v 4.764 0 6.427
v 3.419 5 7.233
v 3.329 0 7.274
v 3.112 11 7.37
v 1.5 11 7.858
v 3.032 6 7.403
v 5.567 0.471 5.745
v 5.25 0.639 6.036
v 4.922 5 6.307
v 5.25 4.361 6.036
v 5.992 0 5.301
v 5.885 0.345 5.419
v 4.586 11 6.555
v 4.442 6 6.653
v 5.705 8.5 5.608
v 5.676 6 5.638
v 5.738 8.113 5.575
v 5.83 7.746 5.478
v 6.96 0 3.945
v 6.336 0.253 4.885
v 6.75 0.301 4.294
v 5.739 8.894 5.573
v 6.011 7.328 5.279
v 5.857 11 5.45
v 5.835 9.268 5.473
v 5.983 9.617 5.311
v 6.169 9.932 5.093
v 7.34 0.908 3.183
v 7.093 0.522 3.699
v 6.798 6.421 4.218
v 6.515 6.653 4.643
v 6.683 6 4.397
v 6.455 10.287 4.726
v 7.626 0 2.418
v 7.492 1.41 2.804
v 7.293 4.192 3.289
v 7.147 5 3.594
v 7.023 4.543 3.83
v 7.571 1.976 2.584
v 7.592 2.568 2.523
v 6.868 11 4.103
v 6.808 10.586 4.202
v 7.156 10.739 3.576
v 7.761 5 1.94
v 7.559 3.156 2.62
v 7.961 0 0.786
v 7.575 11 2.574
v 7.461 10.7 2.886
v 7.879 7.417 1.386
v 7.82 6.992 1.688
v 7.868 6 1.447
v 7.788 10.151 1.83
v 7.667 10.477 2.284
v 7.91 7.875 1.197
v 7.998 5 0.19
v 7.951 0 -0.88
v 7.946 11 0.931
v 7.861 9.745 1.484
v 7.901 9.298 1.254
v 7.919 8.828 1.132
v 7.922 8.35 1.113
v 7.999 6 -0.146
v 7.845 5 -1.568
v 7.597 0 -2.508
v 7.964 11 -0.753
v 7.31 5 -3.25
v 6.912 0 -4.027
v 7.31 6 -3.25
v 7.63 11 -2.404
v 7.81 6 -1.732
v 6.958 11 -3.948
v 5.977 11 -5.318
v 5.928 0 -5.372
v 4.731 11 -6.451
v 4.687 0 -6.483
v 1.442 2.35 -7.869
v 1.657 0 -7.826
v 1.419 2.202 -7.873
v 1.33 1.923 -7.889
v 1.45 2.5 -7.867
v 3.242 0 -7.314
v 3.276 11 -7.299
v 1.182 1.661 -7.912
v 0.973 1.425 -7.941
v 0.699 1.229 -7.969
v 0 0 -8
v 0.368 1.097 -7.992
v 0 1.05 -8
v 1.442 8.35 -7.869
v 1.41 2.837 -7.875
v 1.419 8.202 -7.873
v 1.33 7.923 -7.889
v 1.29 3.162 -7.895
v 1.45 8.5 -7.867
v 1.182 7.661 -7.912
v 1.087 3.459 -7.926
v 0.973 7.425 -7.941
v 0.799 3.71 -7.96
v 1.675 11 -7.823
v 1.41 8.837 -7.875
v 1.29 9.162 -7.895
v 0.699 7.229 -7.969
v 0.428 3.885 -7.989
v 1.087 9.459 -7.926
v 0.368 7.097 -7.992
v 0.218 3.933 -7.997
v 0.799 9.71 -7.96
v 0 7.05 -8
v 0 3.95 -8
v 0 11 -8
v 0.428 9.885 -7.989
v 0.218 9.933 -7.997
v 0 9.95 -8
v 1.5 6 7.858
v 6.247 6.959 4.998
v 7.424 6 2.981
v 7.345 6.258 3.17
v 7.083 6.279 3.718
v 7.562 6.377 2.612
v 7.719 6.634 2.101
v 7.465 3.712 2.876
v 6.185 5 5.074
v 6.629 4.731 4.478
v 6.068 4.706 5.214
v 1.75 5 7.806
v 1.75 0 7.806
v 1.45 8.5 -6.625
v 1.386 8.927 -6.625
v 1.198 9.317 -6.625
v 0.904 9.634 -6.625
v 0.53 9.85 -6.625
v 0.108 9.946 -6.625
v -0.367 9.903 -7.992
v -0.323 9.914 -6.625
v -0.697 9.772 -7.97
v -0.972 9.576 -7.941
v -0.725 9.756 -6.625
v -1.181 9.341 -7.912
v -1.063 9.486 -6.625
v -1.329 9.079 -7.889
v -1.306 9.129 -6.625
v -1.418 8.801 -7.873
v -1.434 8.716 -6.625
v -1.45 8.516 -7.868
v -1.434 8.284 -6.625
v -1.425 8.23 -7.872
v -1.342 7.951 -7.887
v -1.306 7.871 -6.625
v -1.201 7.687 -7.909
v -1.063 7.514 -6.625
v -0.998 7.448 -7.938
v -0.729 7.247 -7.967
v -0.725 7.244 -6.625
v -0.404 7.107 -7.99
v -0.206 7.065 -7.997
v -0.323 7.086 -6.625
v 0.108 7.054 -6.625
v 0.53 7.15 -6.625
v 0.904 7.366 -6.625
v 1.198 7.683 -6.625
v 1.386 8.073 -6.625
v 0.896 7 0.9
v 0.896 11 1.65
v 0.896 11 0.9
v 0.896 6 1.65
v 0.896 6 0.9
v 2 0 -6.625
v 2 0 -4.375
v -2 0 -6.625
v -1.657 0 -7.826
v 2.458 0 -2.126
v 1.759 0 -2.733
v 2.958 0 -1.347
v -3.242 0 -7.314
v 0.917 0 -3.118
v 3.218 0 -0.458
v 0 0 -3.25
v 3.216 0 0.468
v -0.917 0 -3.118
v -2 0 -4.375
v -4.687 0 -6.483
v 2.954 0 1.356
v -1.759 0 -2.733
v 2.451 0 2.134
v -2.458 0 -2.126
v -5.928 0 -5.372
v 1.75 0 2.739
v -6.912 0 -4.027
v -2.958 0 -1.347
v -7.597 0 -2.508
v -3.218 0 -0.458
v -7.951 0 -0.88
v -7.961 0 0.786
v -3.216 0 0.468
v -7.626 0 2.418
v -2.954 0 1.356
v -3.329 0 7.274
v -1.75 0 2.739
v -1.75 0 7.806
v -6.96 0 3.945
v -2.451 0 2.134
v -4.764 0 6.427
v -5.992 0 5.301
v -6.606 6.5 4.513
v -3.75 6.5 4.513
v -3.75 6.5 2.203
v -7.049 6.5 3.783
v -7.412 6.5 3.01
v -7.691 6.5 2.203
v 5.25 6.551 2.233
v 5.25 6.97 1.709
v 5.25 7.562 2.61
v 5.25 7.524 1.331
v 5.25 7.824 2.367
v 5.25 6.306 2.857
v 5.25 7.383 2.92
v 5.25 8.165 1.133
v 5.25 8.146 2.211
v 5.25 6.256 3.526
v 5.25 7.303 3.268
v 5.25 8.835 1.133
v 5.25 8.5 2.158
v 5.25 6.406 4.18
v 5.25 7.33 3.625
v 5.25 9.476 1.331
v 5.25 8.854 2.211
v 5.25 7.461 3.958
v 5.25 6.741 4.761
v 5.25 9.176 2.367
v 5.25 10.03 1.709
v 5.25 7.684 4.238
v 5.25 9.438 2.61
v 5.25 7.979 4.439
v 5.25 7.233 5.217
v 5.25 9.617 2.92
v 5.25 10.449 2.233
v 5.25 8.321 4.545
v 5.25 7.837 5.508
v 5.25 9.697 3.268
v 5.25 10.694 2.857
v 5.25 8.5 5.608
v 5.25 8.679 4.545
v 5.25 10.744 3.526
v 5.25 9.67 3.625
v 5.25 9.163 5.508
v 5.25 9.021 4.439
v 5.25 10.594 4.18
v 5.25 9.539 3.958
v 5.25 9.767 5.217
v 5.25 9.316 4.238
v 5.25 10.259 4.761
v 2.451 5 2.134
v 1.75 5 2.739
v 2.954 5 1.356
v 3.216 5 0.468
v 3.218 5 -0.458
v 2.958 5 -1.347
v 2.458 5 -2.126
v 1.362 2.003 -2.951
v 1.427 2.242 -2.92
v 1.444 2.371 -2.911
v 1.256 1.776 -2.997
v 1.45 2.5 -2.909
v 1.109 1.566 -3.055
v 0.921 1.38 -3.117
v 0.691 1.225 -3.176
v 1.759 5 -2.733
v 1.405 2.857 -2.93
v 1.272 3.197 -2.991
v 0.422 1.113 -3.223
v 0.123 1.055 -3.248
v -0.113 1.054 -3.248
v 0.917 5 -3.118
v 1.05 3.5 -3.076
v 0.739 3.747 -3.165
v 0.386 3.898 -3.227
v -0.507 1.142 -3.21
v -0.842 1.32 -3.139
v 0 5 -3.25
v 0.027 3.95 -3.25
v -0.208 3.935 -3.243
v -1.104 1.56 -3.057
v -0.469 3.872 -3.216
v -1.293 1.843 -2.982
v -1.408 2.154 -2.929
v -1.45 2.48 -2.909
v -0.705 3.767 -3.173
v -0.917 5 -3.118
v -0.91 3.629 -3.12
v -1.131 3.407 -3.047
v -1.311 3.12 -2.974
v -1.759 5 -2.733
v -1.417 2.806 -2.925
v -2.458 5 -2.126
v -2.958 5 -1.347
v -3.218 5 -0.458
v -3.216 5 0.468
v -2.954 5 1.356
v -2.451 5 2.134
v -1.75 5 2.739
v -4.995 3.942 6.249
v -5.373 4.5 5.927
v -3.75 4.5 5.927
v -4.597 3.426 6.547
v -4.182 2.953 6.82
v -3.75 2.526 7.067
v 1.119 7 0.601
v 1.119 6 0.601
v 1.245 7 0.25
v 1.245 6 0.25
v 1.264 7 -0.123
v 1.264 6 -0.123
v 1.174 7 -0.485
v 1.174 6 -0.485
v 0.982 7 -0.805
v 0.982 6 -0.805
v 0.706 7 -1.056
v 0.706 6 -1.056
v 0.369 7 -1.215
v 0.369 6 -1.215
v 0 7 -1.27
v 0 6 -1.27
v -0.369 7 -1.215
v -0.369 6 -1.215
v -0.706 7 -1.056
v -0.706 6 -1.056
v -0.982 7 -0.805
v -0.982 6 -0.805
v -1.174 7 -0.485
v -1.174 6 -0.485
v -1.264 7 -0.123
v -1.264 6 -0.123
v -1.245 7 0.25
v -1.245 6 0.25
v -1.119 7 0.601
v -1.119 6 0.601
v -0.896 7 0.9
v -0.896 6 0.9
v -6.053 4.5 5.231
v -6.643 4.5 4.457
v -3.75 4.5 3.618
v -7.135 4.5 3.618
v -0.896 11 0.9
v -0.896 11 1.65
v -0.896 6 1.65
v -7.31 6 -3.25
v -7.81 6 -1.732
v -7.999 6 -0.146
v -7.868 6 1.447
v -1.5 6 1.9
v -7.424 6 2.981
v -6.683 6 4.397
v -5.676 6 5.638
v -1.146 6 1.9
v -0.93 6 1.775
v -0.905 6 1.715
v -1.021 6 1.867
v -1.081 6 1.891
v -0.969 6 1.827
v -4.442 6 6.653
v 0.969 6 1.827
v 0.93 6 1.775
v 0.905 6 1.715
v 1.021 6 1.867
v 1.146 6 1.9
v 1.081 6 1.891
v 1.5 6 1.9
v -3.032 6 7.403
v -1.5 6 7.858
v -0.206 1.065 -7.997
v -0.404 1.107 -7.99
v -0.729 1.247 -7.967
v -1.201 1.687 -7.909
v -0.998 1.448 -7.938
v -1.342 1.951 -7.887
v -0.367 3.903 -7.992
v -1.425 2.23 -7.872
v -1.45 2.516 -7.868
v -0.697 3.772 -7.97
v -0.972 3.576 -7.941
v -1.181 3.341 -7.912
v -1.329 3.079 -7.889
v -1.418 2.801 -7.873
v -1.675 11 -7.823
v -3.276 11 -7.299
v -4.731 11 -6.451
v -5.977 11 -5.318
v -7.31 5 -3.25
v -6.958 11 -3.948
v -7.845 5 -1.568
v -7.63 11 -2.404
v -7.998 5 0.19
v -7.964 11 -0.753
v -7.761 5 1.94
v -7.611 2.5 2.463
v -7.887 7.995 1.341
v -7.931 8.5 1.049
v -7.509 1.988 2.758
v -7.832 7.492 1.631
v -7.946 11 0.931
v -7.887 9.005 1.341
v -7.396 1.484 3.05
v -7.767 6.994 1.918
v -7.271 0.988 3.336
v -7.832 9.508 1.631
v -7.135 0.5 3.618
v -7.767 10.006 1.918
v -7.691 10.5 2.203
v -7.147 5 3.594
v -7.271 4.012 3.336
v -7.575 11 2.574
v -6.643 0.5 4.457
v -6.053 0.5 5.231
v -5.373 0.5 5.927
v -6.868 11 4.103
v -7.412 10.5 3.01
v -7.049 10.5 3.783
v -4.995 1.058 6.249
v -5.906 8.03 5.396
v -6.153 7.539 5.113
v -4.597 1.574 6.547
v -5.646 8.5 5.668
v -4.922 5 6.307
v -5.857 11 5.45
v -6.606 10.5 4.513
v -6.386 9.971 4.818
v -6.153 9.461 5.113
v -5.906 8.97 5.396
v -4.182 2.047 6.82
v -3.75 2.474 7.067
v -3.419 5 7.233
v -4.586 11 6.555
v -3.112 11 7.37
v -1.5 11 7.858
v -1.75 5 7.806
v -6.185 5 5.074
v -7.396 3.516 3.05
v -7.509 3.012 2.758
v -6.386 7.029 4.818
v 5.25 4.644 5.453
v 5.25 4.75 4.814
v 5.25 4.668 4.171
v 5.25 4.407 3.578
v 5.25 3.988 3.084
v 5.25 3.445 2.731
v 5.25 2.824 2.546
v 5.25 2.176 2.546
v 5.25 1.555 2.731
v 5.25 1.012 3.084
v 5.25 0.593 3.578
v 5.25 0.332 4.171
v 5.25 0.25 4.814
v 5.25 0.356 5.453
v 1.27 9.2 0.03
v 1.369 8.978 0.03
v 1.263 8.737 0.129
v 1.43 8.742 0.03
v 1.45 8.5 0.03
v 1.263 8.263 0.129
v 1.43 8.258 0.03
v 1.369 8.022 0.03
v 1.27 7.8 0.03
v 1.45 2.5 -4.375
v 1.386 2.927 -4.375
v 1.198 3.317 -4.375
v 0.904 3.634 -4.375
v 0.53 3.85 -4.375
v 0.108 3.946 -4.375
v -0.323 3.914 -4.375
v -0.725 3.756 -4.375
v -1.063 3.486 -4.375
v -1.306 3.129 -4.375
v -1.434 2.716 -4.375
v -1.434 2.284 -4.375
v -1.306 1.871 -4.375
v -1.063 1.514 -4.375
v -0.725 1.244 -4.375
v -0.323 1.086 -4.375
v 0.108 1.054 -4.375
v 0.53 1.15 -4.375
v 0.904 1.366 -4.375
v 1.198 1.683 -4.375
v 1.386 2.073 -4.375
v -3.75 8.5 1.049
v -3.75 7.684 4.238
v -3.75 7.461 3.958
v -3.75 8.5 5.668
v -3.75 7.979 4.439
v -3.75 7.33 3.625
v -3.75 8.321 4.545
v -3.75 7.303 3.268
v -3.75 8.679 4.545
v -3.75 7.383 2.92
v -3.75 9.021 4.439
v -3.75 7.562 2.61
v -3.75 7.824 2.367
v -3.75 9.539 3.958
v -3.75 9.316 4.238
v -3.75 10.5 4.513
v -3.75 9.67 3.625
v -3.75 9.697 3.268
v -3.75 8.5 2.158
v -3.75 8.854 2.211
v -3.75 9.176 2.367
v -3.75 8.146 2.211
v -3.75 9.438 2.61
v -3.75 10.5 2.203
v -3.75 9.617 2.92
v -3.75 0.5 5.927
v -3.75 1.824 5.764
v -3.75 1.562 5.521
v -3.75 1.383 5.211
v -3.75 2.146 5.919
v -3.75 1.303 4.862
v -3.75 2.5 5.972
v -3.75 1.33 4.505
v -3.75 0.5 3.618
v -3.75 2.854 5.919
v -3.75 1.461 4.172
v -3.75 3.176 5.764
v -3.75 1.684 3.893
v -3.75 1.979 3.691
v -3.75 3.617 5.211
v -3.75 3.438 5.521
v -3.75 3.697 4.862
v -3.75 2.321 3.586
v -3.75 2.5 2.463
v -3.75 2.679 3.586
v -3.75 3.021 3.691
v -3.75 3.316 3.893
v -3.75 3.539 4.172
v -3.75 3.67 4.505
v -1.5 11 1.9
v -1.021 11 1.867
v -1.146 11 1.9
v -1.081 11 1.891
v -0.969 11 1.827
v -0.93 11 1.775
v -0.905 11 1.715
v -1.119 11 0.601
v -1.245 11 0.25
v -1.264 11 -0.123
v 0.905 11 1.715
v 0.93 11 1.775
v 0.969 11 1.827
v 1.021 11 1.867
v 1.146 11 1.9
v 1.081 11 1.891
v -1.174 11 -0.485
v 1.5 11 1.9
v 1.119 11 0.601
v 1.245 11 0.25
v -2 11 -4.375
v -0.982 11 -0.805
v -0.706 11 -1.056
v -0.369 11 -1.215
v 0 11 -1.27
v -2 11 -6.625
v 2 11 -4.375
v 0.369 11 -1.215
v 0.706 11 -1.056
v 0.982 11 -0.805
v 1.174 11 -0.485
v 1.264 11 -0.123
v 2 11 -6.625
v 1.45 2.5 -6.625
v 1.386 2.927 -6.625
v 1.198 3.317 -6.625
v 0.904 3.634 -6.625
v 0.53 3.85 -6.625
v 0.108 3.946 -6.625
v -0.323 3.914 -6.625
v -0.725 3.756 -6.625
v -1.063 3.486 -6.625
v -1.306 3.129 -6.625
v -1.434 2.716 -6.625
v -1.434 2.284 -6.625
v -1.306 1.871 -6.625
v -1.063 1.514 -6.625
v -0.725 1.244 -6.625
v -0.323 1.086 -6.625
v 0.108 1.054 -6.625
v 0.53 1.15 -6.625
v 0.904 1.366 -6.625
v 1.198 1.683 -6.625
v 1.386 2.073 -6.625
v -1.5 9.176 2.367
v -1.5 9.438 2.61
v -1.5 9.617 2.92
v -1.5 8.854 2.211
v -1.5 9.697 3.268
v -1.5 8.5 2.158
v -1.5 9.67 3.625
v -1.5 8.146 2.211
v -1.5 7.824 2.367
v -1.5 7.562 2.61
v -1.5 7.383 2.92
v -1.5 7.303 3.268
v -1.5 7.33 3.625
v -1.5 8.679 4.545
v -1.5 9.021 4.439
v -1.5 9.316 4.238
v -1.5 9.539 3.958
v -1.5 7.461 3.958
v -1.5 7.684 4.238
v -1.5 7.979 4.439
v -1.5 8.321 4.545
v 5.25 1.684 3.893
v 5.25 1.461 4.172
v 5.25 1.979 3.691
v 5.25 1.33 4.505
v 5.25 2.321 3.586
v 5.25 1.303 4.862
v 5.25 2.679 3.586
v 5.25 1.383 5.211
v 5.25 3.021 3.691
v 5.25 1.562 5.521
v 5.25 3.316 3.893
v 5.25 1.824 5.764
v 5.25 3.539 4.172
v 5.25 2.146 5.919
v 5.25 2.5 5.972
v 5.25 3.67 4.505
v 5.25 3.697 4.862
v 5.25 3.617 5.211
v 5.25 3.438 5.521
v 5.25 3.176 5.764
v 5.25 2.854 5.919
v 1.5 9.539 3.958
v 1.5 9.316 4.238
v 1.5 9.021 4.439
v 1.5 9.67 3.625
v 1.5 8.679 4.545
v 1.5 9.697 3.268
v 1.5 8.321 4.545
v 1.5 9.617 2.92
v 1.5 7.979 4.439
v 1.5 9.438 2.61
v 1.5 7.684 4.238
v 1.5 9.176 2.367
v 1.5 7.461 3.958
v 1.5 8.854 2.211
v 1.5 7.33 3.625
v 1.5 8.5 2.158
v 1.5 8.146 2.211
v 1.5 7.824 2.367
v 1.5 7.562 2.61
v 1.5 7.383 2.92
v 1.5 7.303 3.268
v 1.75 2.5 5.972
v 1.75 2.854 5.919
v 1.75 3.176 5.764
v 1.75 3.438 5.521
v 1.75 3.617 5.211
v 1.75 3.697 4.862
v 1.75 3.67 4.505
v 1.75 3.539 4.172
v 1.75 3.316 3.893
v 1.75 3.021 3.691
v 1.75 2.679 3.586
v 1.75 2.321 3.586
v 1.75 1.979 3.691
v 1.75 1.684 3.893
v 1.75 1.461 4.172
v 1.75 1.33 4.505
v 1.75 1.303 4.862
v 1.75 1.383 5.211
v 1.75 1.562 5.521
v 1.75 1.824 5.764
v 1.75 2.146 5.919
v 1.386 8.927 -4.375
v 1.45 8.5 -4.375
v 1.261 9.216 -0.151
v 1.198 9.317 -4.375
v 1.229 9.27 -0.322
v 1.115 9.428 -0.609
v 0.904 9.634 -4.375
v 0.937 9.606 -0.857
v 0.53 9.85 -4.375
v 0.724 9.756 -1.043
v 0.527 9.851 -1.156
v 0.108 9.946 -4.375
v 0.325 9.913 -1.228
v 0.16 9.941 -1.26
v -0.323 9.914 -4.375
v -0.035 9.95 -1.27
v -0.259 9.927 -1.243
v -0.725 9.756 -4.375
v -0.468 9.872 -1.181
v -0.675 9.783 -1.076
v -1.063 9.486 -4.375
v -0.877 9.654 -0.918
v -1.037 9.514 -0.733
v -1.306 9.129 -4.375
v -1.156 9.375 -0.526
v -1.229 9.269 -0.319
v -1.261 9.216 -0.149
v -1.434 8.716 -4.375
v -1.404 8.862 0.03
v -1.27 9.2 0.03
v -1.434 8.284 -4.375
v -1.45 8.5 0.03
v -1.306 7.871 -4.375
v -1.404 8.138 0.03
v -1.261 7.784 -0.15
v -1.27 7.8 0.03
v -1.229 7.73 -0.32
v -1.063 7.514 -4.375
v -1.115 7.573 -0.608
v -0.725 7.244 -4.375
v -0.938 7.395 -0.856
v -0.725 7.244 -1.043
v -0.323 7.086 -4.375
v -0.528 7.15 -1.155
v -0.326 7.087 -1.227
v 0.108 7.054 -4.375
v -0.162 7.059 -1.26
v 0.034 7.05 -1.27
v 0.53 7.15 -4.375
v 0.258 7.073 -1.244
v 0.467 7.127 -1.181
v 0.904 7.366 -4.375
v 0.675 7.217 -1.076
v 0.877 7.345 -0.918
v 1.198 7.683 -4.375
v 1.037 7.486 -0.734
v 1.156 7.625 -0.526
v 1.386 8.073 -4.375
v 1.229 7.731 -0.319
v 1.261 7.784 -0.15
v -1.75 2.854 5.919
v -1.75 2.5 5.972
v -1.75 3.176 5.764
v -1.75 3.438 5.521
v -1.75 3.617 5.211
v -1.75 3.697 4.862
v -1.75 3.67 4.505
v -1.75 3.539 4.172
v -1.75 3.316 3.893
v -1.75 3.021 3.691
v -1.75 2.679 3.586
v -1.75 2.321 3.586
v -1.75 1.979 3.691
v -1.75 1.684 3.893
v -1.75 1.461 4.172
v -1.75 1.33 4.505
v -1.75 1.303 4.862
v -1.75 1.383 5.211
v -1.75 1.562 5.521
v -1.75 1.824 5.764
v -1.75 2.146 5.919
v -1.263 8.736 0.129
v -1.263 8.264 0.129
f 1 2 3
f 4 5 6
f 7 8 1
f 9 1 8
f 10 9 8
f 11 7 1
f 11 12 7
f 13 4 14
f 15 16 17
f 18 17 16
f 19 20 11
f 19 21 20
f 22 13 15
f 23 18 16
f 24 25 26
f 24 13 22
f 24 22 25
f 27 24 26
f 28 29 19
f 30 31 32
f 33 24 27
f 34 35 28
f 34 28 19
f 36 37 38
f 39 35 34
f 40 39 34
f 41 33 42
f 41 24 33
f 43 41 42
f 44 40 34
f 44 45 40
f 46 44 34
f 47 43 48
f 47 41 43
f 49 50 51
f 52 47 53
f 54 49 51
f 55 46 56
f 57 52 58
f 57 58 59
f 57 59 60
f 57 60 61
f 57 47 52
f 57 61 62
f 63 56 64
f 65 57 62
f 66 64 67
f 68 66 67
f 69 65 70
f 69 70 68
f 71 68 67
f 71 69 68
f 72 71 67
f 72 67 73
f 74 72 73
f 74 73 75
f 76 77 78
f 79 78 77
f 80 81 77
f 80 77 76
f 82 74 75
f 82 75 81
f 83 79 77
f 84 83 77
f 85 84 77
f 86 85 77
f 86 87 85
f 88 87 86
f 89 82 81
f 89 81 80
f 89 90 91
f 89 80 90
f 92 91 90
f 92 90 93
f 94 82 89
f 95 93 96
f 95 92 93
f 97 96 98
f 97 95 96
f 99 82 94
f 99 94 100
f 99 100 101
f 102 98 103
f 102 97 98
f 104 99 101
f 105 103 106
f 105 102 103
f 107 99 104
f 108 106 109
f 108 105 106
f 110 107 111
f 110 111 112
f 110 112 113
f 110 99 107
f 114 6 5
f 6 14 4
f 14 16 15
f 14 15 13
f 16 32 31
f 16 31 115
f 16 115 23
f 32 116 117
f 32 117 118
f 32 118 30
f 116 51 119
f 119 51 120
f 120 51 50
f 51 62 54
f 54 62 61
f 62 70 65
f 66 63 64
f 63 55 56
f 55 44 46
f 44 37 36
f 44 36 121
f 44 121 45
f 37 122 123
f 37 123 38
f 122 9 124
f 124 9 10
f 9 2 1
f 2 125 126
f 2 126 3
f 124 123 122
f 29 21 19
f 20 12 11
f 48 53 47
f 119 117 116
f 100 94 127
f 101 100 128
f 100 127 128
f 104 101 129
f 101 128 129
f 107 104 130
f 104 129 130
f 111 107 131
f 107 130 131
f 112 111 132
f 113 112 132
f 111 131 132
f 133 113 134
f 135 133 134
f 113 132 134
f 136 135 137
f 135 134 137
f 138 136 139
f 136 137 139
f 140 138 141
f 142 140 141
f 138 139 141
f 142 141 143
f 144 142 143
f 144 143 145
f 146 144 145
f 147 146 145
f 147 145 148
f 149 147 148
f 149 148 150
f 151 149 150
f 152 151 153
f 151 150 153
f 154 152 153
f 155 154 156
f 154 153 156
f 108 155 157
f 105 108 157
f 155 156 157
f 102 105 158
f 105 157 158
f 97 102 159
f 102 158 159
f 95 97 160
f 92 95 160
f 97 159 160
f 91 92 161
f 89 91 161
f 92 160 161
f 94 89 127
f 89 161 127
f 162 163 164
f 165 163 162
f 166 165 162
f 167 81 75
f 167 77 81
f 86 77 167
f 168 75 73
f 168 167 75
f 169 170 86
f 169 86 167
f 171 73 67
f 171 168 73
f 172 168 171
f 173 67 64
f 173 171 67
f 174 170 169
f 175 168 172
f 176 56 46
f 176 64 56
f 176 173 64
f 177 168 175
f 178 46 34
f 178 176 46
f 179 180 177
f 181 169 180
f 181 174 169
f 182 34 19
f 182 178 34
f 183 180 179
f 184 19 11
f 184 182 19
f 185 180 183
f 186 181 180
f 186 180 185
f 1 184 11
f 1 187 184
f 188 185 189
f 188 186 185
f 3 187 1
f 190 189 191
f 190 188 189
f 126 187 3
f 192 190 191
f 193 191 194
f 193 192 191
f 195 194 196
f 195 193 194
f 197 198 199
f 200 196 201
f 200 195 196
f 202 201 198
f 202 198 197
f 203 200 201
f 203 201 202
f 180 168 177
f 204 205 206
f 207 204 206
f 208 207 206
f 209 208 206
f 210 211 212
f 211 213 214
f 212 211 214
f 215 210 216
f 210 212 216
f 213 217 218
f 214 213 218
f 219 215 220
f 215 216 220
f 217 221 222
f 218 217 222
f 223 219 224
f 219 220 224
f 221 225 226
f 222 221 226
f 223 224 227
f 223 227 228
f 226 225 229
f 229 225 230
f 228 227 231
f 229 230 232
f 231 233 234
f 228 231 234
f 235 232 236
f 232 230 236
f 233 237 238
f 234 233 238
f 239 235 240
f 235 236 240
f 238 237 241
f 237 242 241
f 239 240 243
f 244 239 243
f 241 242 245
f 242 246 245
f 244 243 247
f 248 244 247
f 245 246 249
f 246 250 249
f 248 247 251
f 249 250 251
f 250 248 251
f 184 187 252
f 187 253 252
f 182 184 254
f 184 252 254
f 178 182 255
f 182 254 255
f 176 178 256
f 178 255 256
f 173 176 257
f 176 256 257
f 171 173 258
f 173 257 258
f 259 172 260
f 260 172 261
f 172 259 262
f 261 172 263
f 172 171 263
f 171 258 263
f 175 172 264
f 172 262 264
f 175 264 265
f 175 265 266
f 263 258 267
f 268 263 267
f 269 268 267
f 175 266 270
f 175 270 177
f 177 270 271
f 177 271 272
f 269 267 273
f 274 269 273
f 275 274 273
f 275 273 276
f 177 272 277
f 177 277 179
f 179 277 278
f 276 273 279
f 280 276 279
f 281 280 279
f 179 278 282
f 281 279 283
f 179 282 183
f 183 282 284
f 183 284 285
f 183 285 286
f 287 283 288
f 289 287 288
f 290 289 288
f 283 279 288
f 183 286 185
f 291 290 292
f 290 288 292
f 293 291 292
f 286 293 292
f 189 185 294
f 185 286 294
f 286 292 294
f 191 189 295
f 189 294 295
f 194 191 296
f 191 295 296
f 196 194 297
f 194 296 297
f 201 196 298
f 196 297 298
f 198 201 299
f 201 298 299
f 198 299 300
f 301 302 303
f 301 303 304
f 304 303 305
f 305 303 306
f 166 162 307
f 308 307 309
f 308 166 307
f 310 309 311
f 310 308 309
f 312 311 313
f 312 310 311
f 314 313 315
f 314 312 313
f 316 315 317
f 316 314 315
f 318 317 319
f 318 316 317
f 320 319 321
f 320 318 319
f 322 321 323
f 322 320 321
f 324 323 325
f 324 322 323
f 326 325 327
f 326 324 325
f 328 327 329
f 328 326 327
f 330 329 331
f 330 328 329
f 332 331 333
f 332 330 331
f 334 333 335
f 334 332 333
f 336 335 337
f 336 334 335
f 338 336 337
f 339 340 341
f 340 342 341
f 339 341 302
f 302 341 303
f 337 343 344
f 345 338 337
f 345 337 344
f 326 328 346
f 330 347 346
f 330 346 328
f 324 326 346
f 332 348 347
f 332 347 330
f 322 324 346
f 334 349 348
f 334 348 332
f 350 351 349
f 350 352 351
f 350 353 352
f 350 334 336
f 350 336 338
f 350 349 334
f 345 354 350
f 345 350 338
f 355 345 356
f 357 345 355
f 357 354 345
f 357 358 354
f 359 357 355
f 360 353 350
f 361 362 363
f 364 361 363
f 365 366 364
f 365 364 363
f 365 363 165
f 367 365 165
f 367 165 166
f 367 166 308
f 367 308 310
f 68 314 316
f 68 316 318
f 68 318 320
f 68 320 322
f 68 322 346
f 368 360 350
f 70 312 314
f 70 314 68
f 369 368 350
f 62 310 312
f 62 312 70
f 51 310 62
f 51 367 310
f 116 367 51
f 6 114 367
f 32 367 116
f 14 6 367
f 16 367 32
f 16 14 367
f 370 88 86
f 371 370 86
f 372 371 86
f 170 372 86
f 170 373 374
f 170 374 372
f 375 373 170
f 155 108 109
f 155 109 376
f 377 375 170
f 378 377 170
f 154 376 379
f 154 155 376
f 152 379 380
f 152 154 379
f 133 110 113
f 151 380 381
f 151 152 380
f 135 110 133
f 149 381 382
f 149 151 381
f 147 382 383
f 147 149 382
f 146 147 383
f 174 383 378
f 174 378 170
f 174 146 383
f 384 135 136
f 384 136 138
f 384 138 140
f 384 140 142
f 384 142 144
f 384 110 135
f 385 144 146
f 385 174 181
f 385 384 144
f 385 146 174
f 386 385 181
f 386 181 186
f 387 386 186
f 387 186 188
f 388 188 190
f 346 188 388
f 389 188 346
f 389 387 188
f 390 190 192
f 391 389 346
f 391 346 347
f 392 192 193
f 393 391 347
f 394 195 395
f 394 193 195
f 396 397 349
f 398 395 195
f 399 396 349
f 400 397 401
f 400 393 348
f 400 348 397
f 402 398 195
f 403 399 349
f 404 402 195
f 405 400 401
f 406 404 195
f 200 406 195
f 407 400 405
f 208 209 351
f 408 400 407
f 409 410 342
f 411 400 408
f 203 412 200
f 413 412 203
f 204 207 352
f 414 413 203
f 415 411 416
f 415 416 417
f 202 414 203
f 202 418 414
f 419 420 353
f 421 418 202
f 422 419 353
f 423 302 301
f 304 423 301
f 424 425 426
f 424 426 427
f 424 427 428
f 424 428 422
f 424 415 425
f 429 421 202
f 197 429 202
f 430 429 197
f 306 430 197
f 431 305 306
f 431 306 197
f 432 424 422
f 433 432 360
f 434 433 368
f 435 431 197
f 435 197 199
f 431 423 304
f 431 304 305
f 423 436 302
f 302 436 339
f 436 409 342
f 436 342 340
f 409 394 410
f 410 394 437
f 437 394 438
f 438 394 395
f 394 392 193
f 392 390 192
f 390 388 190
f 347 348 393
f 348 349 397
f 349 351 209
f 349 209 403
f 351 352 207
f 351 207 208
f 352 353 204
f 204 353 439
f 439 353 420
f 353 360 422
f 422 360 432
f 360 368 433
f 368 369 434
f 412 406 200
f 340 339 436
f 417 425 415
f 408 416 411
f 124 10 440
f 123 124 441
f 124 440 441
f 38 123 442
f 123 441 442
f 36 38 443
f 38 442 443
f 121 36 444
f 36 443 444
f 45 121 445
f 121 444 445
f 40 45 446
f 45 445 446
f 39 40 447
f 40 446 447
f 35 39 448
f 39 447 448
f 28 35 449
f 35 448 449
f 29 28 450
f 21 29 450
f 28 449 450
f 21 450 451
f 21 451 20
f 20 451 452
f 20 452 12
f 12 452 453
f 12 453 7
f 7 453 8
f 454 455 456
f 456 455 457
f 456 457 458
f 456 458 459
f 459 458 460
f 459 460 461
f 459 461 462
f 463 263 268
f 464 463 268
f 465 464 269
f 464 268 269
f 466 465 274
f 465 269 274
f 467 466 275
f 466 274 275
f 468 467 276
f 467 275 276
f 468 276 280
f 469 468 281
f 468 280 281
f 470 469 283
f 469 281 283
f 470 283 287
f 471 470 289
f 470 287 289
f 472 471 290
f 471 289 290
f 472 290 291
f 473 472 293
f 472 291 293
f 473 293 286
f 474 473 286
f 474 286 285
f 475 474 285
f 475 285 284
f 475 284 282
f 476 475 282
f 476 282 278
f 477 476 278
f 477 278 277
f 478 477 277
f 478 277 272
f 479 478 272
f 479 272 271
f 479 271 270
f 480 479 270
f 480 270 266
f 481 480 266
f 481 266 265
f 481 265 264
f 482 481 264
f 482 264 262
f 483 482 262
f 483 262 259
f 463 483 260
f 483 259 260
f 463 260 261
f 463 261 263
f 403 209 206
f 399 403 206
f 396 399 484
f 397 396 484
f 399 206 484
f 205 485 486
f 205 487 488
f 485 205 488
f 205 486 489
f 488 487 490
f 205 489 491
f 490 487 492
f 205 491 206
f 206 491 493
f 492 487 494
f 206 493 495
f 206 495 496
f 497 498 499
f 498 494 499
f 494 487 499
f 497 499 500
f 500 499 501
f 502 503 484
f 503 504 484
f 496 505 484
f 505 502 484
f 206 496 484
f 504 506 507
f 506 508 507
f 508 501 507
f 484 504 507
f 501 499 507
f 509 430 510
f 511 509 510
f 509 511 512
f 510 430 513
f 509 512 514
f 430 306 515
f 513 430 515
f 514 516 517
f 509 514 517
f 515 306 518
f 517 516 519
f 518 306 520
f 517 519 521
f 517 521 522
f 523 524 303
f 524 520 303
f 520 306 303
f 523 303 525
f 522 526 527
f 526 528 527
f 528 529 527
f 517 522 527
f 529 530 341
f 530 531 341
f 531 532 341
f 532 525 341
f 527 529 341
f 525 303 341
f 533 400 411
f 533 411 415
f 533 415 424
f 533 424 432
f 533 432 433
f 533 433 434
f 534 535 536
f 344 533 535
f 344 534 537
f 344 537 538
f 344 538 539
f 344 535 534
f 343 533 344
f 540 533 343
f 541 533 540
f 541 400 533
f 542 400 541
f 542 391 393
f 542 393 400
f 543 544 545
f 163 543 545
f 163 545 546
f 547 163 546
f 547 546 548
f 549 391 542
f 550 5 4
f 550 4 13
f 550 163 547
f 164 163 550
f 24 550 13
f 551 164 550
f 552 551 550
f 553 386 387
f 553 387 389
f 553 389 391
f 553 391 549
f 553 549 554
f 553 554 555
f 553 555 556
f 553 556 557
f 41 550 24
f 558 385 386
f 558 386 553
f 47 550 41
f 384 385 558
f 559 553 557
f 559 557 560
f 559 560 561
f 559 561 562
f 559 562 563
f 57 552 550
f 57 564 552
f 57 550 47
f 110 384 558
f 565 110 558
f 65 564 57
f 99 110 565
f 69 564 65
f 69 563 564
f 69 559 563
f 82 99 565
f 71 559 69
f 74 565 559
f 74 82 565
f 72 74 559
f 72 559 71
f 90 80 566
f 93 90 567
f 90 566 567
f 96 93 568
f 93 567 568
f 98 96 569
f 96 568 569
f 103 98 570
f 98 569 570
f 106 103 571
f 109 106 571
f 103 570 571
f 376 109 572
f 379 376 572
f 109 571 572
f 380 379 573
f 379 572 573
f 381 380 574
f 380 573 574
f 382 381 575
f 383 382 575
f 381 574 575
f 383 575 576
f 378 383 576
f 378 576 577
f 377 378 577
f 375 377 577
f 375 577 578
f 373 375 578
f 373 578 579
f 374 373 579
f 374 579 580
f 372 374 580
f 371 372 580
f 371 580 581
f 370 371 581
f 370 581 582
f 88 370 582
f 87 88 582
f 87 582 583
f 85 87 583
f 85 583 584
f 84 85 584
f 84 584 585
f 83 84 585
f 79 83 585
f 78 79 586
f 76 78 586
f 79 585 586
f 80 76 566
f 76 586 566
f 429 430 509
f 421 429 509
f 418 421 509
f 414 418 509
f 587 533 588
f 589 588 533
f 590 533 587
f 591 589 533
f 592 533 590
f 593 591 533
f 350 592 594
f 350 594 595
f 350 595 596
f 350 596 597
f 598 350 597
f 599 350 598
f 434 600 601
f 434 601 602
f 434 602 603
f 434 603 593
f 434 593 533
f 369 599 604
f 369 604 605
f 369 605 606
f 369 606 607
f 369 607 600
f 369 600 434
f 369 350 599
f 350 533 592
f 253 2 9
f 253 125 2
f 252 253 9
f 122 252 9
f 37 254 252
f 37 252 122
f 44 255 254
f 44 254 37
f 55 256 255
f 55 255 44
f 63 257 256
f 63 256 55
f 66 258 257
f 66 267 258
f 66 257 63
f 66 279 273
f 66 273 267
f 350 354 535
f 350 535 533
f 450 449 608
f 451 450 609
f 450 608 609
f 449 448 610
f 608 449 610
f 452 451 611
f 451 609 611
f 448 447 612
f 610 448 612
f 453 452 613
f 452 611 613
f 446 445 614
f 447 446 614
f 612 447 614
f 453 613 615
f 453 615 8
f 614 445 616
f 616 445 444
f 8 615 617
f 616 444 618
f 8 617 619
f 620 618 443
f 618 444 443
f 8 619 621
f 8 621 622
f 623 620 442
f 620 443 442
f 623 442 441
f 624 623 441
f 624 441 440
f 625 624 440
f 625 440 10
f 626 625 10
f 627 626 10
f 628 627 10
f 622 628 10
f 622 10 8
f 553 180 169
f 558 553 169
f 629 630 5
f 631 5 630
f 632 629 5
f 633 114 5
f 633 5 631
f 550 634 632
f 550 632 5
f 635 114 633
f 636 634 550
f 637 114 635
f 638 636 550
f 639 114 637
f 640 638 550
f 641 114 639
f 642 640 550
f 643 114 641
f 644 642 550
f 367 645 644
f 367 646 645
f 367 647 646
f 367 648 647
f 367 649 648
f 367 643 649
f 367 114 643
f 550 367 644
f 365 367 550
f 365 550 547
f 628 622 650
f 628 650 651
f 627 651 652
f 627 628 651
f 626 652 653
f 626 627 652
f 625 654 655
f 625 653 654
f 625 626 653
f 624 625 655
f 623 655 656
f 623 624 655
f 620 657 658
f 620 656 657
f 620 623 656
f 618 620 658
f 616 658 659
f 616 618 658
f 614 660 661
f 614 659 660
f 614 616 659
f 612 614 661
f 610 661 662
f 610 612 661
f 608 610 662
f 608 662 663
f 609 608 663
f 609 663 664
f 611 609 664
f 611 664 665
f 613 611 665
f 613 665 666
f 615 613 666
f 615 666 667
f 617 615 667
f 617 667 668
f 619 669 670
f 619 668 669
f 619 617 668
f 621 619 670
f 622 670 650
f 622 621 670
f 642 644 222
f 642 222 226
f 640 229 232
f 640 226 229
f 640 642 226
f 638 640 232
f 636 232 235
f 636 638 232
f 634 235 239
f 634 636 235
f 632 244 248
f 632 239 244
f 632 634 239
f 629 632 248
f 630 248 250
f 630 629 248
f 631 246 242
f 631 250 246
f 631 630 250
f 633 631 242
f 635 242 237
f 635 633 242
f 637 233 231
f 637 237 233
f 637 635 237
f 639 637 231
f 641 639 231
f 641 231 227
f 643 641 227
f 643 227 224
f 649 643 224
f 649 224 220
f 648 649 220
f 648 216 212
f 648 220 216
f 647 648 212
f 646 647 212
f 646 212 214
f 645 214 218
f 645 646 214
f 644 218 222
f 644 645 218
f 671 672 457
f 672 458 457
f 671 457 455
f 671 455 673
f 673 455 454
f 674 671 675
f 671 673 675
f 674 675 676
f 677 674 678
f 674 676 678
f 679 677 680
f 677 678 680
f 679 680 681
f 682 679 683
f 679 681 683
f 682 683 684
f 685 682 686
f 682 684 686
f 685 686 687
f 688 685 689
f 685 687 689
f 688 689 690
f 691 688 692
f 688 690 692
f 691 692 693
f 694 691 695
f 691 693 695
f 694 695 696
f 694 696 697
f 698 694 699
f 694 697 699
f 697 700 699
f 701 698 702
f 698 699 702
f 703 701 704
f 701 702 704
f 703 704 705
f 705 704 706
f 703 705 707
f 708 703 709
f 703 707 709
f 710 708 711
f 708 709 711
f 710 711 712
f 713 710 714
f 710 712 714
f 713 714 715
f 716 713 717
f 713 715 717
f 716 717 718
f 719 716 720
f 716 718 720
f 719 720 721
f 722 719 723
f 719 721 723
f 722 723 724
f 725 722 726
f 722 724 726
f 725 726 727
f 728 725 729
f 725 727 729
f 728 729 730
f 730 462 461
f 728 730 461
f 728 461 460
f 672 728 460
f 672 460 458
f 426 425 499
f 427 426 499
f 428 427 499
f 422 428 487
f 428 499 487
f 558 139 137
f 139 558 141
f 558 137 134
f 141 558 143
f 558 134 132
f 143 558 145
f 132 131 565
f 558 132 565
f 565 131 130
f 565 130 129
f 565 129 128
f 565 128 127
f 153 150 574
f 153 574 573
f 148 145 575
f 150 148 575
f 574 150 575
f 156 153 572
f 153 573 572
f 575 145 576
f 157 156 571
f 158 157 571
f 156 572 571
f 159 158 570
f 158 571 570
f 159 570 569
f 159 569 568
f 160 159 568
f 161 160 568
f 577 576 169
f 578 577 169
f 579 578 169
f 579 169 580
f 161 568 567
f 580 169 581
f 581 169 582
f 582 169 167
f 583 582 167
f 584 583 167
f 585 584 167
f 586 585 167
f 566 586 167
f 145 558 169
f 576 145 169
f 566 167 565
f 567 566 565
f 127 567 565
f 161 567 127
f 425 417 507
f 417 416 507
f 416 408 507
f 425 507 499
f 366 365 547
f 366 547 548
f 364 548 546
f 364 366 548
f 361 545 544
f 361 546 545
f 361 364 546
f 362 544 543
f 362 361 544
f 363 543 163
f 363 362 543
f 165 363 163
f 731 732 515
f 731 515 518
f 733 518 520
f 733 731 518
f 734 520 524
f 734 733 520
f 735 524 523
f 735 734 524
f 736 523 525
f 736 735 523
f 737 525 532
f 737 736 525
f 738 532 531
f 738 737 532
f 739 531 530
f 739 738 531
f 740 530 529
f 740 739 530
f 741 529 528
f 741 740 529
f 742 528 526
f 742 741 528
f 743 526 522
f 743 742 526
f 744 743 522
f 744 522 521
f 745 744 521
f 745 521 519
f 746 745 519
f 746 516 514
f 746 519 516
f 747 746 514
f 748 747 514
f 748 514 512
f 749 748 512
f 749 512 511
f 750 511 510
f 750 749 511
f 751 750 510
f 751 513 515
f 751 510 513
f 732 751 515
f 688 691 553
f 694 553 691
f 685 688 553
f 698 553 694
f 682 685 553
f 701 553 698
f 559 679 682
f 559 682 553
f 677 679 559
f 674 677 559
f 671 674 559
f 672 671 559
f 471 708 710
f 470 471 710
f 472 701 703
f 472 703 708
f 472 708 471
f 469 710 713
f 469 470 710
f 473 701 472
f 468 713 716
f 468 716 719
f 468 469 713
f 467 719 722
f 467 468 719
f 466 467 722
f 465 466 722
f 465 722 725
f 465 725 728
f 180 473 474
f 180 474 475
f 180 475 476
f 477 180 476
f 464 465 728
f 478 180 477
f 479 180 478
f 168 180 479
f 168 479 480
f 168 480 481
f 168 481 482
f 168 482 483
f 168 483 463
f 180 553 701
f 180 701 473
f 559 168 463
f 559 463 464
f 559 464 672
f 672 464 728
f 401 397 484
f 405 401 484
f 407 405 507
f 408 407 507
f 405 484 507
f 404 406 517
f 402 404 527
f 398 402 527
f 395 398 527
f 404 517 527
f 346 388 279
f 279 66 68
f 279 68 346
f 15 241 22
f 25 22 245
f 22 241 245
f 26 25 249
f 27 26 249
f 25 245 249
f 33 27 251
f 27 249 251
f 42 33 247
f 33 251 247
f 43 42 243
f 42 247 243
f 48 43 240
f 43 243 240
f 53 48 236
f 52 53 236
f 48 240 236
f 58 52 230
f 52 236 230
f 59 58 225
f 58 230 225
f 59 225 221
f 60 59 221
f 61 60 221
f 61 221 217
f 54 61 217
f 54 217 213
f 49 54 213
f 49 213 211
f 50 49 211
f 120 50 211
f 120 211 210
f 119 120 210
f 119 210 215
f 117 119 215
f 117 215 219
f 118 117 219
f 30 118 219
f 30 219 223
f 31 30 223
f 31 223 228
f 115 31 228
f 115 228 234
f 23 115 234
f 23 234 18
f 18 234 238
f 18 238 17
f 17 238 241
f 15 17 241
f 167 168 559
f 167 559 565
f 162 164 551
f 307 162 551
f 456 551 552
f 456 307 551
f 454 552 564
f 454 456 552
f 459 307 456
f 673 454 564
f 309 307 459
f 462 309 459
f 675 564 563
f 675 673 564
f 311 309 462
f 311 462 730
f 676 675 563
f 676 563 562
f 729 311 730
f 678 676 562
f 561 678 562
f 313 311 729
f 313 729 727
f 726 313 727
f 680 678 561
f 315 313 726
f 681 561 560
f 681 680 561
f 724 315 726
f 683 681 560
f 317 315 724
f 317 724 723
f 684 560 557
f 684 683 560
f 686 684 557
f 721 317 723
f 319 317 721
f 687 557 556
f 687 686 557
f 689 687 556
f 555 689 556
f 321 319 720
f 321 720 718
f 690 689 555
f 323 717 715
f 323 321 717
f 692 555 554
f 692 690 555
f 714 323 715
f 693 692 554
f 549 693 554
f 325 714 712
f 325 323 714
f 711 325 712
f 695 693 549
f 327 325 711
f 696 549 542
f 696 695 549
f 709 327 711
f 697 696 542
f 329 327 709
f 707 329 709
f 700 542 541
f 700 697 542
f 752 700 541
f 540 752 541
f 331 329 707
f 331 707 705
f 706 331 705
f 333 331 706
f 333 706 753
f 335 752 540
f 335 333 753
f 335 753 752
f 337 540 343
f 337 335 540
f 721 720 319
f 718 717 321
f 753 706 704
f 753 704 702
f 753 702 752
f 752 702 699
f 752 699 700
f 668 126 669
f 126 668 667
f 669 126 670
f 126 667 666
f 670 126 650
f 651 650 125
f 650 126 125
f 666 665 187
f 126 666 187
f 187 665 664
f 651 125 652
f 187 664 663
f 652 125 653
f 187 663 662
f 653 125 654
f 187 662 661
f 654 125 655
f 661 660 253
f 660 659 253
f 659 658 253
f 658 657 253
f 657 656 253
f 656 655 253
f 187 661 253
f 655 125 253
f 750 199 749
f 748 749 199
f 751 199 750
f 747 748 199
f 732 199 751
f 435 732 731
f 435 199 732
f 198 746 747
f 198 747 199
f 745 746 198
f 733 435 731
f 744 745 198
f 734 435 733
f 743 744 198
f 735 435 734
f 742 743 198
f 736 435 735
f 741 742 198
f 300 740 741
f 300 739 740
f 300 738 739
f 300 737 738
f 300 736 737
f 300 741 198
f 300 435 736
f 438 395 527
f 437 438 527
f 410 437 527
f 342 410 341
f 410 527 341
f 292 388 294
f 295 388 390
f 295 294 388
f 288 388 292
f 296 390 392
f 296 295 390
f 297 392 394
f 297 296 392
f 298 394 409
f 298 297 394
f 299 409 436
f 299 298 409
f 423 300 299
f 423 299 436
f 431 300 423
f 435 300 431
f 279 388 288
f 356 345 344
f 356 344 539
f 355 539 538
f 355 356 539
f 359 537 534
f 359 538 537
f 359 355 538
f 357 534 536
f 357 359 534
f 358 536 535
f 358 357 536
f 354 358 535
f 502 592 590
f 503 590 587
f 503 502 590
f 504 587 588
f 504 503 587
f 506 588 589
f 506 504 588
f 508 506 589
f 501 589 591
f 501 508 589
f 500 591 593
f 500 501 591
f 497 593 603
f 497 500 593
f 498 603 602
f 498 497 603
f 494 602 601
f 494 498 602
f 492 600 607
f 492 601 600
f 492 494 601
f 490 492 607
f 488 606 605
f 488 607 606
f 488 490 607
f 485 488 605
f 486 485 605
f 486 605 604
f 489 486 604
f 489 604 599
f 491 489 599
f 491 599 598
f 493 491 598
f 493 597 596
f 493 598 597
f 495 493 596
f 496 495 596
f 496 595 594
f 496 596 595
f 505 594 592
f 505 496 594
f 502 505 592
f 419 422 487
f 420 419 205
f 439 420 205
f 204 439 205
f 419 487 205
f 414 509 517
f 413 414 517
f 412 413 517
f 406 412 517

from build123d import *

# Parameters (mm, degrees)
SKETCH1_W                            = 4.75
SKETCH1_H                            = 7
FILLET1_R                            = 1
SKETCH16_W                           = 16
SKETCH16_H                           = 1
CUT_EXTRUDE5_DEPTH                   = 1
CUT_EXTRUDE5_DIRECTION_2_REACH       = 18.492
CUT_EXTRUDE6_REACH                   = 15.304
SKETCH17_W                           = 3.5
SKETCH17_H                           = 5.261387212
CUT_EXTRUDE7_DEPTH                   = 18.408690359
CUT_EXTRUDE7_DEPTH_BACK              = 18.408690359
SKETCH18_R                           = 1.2
CUT_EXTRUDE10_START                  = -6
SKETCH21_R                           = 1.27
CUT_EXTRUDE10_DEPTH                  = 6
CUT_EXTRUDE11_DEPTH                  = 18.26991621
CUT_EXTRUDE11_DEPTH_BACK             = 18.26991621
SKETCH22_R                           = 1.2
CUT_EXTRUDE9_REACH                   = 20.603
CUT_EXTRUDE9_END_RADIUS              = 8
SKETCH20_R                           = 1.2
CUT_EXTRUDE12_REACH                  = 21.585
SKETCH19_R                           = 2.25
CUT_EXTRUDE13_REACH                  = 21.585
CUT_EXTRUDE13_END_RADIUS             = 8
SKETCH24_R                           = 2.25
CUT_EXTRUDE14_REACH                  = 18.492
CUT_EXTRUDE14_END_RADIUS             = 8
SKETCH25_W                           = 2.25
SKETCH25_H                           = 1
CUT_EXTRUDE14_DIRECTION_2_REACH      = 18.492
CUT_EXTRUDE14_DIRECTION_2_END_RADIUS = 8
M2_5_CLEARANCE_HOLE1_D               = 2.9
M2_5_CLEARANCE_HOLE1_DEPTH           = 8.029752102
M2_5_CLEARANCE_HOLE1_TIP             = 0.871247898
CUT_EXTRUDE15_START                  = -12
SKETCH29_W                           = 4
SKETCH29_H                           = 2.25
CUT_EXTRUDE15_DEPTH                  = 12
FILLET3_R                            = 0.25
SKETCH30_R                           = 8
CUT_EXTRUDE19_DEPTH                  = 1
BOSS_EXTRUDE1_START                  = 1
BOSS_EXTRUDE1_DEPTH                  = 1


with BuildPart() as part:
    # Sketch1 → Revolve1 (revolve)
    with BuildSketch(Plane.XY, mode=Mode.PRIVATE) as revolve1_sk:
        with Locations((5.625, 3.5)):
            Rectangle(SKETCH1_W, SKETCH1_H)
    revolve(revolve1_sk.sketch.rotate(Axis((0, 0, 0), (0, 1, 0)), 90), axis=Axis((0, 0, 0), (0, 1, 0)))

    # Sketch1<3> → Revolve2 (revolve)
    with BuildSketch(Plane.XY, mode=Mode.PRIVATE) as revolve2_sk:
        Polygon((1.27, 7), (3.25, 7), (8, 7), (8, 12), (1.27, 12), align=None)
    revolve(revolve2_sk.sketch.rotate(Axis((0, 0, 0), (0, 1, 0)), 90), axis=Axis((0, 0, 0), (0, 1, 0)))

    # Fillet1
    fillet1_edges = [part.edges().sort_by_distance(p)[0] for p in [
        (0, 12, 8),
    ]]
    fillet(fillet1_edges, radius=FILLET1_R)

    # Sketch16 → Cut-Extrude5 (cut)
    with BuildSketch(Plane.XY):
        with Locations((0, 5.5)):
            Rectangle(SKETCH16_W, SKETCH16_H)
    extrude(amount=-CUT_EXTRUDE5_DEPTH, mode=Mode.SUBTRACT)

    # Sketch16 → Cut-Extrude5 direction 2 (cut, up to next)
    with BuildSketch(Plane.XY, mode=Mode.PRIVATE) as cut_extrude5_direction_2_sk1:
        with Locations((0, 5.5)):
            Rectangle(SKETCH16_W, SKETCH16_H)
    cut_extrude5_direction_2_tool1 = extrude(cut_extrude5_direction_2_sk1.sketch, amount=CUT_EXTRUDE5_DIRECTION_2_REACH, mode=Mode.PRIVATE) & part.part
    add(cut_extrude5_direction_2_tool1.solids().sort_by_distance((0, 5.5, 0))[0], mode=Mode.SUBTRACT)

    # Sketch17 → Cut-Extrude6 (cut, up to next)
    with BuildSketch(Plane(origin=(0, 5, 0), x_dir=(1, 0, 0), z_dir=(0, 1, 0)), mode=Mode.PRIVATE) as cut_extrude6_sk1:
        with Locations((0, -5.369306394)):
            Rectangle(SKETCH17_W, SKETCH17_H)
    cut_extrude6_tool1 = extrude(cut_extrude6_sk1.sketch, amount=-CUT_EXTRUDE6_REACH, mode=Mode.PRIVATE) & part.part
    add(cut_extrude6_tool1.solids().sort_by_distance((0, 5, 5.369306))[0], mode=Mode.SUBTRACT)

    # Sketch18 → Cut-Extrude7 (cut, two sides: drawn at the far end of the back side and taken through both)
    with BuildSketch(Plane.ZY.offset(-1.75).offset(-CUT_EXTRUDE7_DEPTH_BACK)):
        with Locations((4.772430143, 2.5)):
            Circle(SKETCH18_R)
    extrude(amount=CUT_EXTRUDE7_DEPTH + CUT_EXTRUDE7_DEPTH_BACK, mode=Mode.SUBTRACT)

    # Sketch21 → Cut-Extrude10 (cut)
    with BuildSketch(Plane(origin=(0, 12, 0), x_dir=(1, 0, 0), z_dir=(0, 1, 0)).offset(CUT_EXTRUDE10_START)):
        Circle(SKETCH21_R)
        Polygon((-1.5, -1.9), (-1.5, -11.891029443), (1.5, -11.891029443), (1.5, -1.9), (0.896046874, -1.9), (0.896046874, -0.9), (-0.896046874, -0.9), (-0.896046874, -1.9), align=None)
    extrude(amount=CUT_EXTRUDE10_DEPTH, mode=Mode.SUBTRACT)

    # Sketch22 → Cut-Extrude11 (cut, two sides: drawn at the far end of the back side and taken through both)
    with BuildSketch(Plane(origin=(-1.5, 0, 0), x_dir=(0, 0, -1), z_dir=(1, 0, 0)).offset(-CUT_EXTRUDE11_DEPTH_BACK)):
        with Locations((-3.358116823, 8.5)):
            Circle(SKETCH22_R)
    extrude(amount=CUT_EXTRUDE11_DEPTH + CUT_EXTRUDE11_DEPTH_BACK, mode=Mode.SUBTRACT)

    # Cut-Extrude9: up to this cylinder (the profile starts inside it)
    cut_extrude9_end = Plane(origin=(0, 5.9847245, 0), z_dir=(0, -1, 0)) * Cylinder(CUT_EXTRUDE9_END_RADIUS, 65.175449, mode=Mode.PRIVATE)
    # Sketch20 → Cut-Extrude9 (cut, up to the surface)
    with BuildSketch(Plane(origin=(-3.75, 0, 0), x_dir=(0, 0, -1), z_dir=(1, 0, 0)), mode=Mode.PRIVATE) as cut_extrude9_sk1:
        Polygon((-2.463029066, 2.5), (-3.617729604, 4.5), (-5.927130681, 4.5), (-7.08183122, 2.5), (-5.927130681, 0.5), (-3.617729604, 0.5), align=None)
    cut_extrude9_tool1 = extrude(cut_extrude9_sk1.sketch, amount=-CUT_EXTRUDE9_REACH, mode=Mode.PRIVATE) & cut_extrude9_end
    add(cut_extrude9_tool1.solids().sort_by_distance((-3.75, 2.5, 4.77243))[0], mode=Mode.SUBTRACT)
    # Sketch20 → Cut-Extrude9 (cut, up to the surface)
    with BuildSketch(Plane(origin=(-3.75, 0, 0), x_dir=(0, 0, -1), z_dir=(1, 0, 0)), mode=Mode.PRIVATE) as cut_extrude9_sk2:
        Polygon((-1.048715746, 8.5), (-2.203416284, 10.5), (-4.512817361, 10.5), (-5.6675179, 8.5), (-4.512817361, 6.5), (-2.203416284, 6.5), align=None)
        with Locations((-3.358116823, 8.5)):
            Circle(SKETCH20_R, mode=Mode.SUBTRACT)
    cut_extrude9_tool2 = extrude(cut_extrude9_sk2.sketch, amount=-CUT_EXTRUDE9_REACH, mode=Mode.PRIVATE) & cut_extrude9_end
    add(cut_extrude9_tool2.solids().sort_by_distance((-3.75, 9.469449, 1.678981))[0], mode=Mode.SUBTRACT)

    # Sketch19 → Cut-Extrude12 (cut, up to next)
    with BuildSketch(Plane.ZY.offset(-5.25), mode=Mode.PRIVATE) as cut_extrude12_sk1:
        with Locations((4.772430143, 2.5)):
            Circle(SKETCH19_R)
    cut_extrude12_tool1 = extrude(cut_extrude12_sk1.sketch, amount=-CUT_EXTRUDE12_REACH, mode=Mode.PRIVATE) & part.part
    add(cut_extrude12_tool1.solids().sort_by_distance((5.25, 2.5, 4.77243))[0], mode=Mode.SUBTRACT)

    # Cut-Extrude13: up to this cylinder (the profile starts inside it)
    cut_extrude13_end = Plane(origin=(0, 8.5, 0), z_dir=(0, -1, 0)) * Cylinder(CUT_EXTRUDE13_END_RADIUS, 60.17, mode=Mode.PRIVATE)
    # Sketch24 → Cut-Extrude13 (cut, up to the surface)
    with BuildSketch(Plane.ZY.offset(-5.25), mode=Mode.PRIVATE) as cut_extrude13_sk1:
        with Locations((3.358116823, 8.5)):
            Circle(SKETCH24_R)
    cut_extrude13_tool1 = extrude(cut_extrude13_sk1.sketch, amount=-CUT_EXTRUDE13_REACH, mode=Mode.PRIVATE) & cut_extrude13_end
    add(cut_extrude13_tool1.solids().sort_by_distance((5.25, 8.5, 3.358117))[0], mode=Mode.SUBTRACT)

    # Cut-Extrude14: up to this cylinder (the profile starts inside it)
    cut_extrude14_end = Plane(origin=(0, 5.5, 0), z_dir=(0, -1, 0)) * Cylinder(CUT_EXTRUDE14_END_RADIUS, 53.984, mode=Mode.PRIVATE)
    # Sketch25 → Cut-Extrude14 (cut, up to the surface)
    with BuildSketch(Plane.ZY, mode=Mode.PRIVATE) as cut_extrude14_sk1:
        with Locations((-2.125, 5.5)):
            Rectangle(SKETCH25_W, SKETCH25_H)
    cut_extrude14_tool1 = extrude(cut_extrude14_sk1.sketch, amount=-CUT_EXTRUDE14_REACH, mode=Mode.PRIVATE) & cut_extrude14_end
    add(cut_extrude14_tool1.solids().sort_by_distance((0, 5.5, -2.125))[0], mode=Mode.SUBTRACT)

    # Cut-Extrude14 direction 2: up to this cylinder (the profile starts inside it)
    cut_extrude14_direction_2_end = Plane(origin=(0, 5.5, 0), z_dir=(0, -1, 0)) * Cylinder(CUT_EXTRUDE14_DIRECTION_2_END_RADIUS, 53.984, mode=Mode.PRIVATE)
    # Sketch25 → Cut-Extrude14 direction 2 (cut, up to the surface)
    with BuildSketch(Plane.ZY, mode=Mode.PRIVATE) as cut_extrude14_direction_2_sk1:
        with Locations((-2.125, 5.5)):
            Rectangle(SKETCH25_W, SKETCH25_H)
    cut_extrude14_direction_2_tool1 = extrude(cut_extrude14_direction_2_sk1.sketch, amount=CUT_EXTRUDE14_DIRECTION_2_REACH, mode=Mode.PRIVATE) & cut_extrude14_direction_2_end
    add(cut_extrude14_direction_2_tool1.solids().sort_by_distance((0, 5.5, -2.125))[0], mode=Mode.SUBTRACT)

    # M2.5 Clearance Hole1
    with Locations(Plane(origin=(0, 0, -8), x_dir=(-1, 0, 0), z_dir=(0, 0, -1))):
        with Locations((0, 8.5), (0, 2.5)):
            Hole(M2_5_CLEARANCE_HOLE1_D / 2, depth=M2_5_CLEARANCE_HOLE1_DEPTH)
            with Locations((0, 0, -(M2_5_CLEARANCE_HOLE1_DEPTH + M2_5_CLEARANCE_HOLE1_TIP / 2))):  # 118° drill point
                Cone(0, M2_5_CLEARANCE_HOLE1_D / 2, M2_5_CLEARANCE_HOLE1_TIP, mode=Mode.SUBTRACT)

    # Sketch29 → Cut-Extrude15 (cut)
    with BuildSketch(Plane(origin=(0, 12, 0), x_dir=(1, 0, 0), z_dir=(0, 1, 0)).offset(CUT_EXTRUDE15_START)):
        with Locations((0, 5.5)):
            Rectangle(SKETCH29_W, SKETCH29_H)
    extrude(amount=CUT_EXTRUDE15_DEPTH, mode=Mode.SUBTRACT)

    # Fillet3
    fillet3_edges = [part.edges().sort_by_distance(p)[0] for p in [
        (0.896046874, 9.5, 1.9),
        (-0.896046874, 9.5, 1.9),
    ]]
    fillet(fillet3_edges, radius=FILLET3_R)

    # Sketch30 → Cut-Extrude19 (cut)
    with BuildSketch(Plane(origin=(0, 12, 0), x_dir=(1, 0, 0), z_dir=(0, 1, 0))):
        Circle(SKETCH30_R)
    extrude(amount=-CUT_EXTRUDE19_DEPTH, mode=Mode.SUBTRACT)

    # Sketch31 → Boss-Extrude1 (add)
    with BuildSketch(Plane.XZ.offset(-7).offset(BOSS_EXTRUDE1_START)):
        with BuildLine():
            Line((-0.896046874, 0.9), (-0.896046874, 1.65))
            ThreePointArc((-0.896046874, 1.65), (-0.969270178, 1.826776695), (-1.146046874, 1.9))
            Line((-1.146046874, 1.9), (-1.5, 1.9))
            Line((-1.5, 1.9), (-1.5, 2.883140649))
            ThreePointArc((-1.5, 2.883140649), (0, -3.25), (1.5, 2.883140649))
            Line((1.5, 2.883140649), (1.5, 1.9))
            Line((1.5, 1.9), (1.146046874, 1.9))
            ThreePointArc((1.146046874, 1.9), (0.969270178, 1.826776695), (0.896046874, 1.65))
            Line((0.896046874, 1.65), (0.896046874, 0.9))
            ThreePointArc((0.896046874, 0.9), (0, -1.27), (-0.896046874, 0.9))
        make_face()
    extrude(amount=-BOSS_EXTRUDE1_DEPTH)


solid = part.part
